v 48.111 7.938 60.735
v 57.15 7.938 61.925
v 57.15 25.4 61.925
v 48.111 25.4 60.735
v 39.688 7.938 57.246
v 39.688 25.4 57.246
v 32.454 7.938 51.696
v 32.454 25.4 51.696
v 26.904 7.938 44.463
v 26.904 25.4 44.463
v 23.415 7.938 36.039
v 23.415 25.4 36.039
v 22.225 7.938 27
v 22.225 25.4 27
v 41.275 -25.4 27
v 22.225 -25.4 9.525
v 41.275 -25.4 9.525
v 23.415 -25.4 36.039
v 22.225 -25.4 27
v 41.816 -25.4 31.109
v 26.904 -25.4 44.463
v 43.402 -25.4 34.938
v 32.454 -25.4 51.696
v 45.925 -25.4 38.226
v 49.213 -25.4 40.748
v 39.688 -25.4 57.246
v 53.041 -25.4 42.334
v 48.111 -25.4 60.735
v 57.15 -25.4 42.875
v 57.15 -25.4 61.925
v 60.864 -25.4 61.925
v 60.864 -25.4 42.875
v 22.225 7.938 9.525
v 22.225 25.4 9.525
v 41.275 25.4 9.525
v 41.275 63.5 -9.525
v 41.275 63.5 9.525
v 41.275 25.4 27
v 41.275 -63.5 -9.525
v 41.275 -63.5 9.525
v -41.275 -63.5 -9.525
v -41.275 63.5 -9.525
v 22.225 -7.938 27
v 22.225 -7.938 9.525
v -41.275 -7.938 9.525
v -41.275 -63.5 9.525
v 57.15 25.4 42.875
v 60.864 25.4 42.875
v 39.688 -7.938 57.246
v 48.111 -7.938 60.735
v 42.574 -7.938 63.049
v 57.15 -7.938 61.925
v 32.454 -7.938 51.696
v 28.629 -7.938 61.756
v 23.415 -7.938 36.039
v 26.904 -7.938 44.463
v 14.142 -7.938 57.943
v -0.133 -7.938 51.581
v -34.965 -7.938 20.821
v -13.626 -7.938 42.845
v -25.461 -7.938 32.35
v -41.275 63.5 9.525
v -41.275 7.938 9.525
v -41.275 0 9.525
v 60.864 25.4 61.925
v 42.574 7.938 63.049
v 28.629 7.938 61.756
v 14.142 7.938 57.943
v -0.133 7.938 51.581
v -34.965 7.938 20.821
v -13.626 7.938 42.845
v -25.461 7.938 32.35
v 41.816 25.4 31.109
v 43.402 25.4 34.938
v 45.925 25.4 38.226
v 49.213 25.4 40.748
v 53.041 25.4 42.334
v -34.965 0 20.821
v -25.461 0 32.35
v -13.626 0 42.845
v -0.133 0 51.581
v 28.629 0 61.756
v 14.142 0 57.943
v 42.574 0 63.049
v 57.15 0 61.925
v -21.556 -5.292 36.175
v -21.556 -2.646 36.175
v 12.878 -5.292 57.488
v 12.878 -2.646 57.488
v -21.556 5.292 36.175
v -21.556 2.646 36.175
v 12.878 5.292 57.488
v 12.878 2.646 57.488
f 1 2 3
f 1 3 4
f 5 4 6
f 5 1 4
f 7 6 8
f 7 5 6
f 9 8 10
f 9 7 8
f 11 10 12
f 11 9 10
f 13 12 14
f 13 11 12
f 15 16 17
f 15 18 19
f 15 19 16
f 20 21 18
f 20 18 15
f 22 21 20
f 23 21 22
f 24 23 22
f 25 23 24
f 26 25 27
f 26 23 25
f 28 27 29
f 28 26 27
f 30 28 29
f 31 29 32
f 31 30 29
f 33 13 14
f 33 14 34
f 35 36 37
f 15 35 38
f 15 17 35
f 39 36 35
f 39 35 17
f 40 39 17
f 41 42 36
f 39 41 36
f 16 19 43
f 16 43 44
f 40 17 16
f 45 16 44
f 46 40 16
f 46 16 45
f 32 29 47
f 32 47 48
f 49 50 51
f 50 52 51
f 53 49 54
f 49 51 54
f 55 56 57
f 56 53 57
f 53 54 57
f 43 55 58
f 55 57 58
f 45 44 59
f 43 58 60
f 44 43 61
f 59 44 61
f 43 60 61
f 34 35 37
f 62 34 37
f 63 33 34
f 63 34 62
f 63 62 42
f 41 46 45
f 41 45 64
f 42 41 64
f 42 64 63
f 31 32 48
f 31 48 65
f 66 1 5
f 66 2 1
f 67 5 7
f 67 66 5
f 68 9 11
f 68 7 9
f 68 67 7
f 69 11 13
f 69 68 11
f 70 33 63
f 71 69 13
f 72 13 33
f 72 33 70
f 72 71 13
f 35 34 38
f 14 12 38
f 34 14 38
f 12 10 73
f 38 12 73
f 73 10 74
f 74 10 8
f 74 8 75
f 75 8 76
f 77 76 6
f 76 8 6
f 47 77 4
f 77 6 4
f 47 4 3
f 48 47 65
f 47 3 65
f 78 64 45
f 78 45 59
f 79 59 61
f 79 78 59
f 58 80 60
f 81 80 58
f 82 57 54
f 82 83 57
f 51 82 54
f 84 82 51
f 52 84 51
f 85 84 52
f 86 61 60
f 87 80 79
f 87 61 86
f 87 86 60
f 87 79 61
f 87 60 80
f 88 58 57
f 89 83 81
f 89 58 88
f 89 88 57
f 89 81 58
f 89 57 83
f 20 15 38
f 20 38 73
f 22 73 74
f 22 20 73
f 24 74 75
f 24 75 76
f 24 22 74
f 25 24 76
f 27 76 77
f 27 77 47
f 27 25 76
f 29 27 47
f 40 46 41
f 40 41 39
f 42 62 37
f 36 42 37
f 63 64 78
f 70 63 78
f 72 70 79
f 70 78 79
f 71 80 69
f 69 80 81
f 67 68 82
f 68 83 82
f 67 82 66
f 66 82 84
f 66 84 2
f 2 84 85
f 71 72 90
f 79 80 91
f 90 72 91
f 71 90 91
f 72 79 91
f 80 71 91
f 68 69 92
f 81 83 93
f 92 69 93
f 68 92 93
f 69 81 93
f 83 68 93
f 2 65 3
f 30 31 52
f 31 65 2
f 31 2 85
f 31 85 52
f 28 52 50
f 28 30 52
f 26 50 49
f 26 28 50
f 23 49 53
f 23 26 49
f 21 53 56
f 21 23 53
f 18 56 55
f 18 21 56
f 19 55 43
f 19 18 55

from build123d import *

# Parameters (mm, degrees)
F1_DEPTH = 63.5
F2_DEPTH = 25.4
F3_DEPTH = 7.9375


with BuildPart() as f1:
    # F0 (on Front) → F1 (new body, symmetric)
    with BuildSketch(Plane.XZ):
        Polygon((-41.275, 9.525), (-41.275, -9.525), (41.275, -9.525), (41.275, 9.525), (22.225, 9.525), align=None)
    extrude(amount=F1_DEPTH, both=True)

    # F0 (on Front) → F2 (join, symmetric)
    with BuildSketch(Plane.XZ):
        with BuildLine():
            Line((22.225, 9.525), (41.275, 9.525))
            Line((41.275, 9.525), (41.275, 27.0002))
            ThreePointArc((41.275, 27.0002), (45.9246798487, 38.2255201513), (57.15, 42.8752))
            Line((57.15, 42.8752), (60.8642640084, 42.8752))
            Line((60.8642640084, 42.8752), (60.8642640084, 61.9252))
            Line((60.8642640084, 61.9252), (57.15, 61.9252))
            ThreePointArc((57.15, 61.9252), (32.4542956671, 51.6959043329), (22.225, 27.0002))
            Line((22.225, 27.0002), (22.225, 9.525))
        make_face()
    extrude(amount=F2_DEPTH, both=True)

    # F0 (on Front) → F3 (join, symmetric)
    with BuildSketch(Plane.XZ):
        with BuildLine():
            add(Edge.make_bspline(
                [(-41.275, 9.525), (-30.5388011038, 34.9970385432), (9.5851859078, 69.7711631656), (57.15, 61.9252)],
                knots=[0, 0, 0, 0, 111.5045361635, 111.5045361635, 111.5045361635, 111.5045361635], degree=3))
            Line((-41.275, 9.525), (22.225, 9.525))
            Line((22.225, 9.525), (22.225, 27.0002))
            ThreePointArc((22.225, 27.0002), (32.4542956671, 51.6959043329), (57.15, 61.9252))
        make_face()
    extrude(amount=F3_DEPTH, both=True)


solid = f1.part
